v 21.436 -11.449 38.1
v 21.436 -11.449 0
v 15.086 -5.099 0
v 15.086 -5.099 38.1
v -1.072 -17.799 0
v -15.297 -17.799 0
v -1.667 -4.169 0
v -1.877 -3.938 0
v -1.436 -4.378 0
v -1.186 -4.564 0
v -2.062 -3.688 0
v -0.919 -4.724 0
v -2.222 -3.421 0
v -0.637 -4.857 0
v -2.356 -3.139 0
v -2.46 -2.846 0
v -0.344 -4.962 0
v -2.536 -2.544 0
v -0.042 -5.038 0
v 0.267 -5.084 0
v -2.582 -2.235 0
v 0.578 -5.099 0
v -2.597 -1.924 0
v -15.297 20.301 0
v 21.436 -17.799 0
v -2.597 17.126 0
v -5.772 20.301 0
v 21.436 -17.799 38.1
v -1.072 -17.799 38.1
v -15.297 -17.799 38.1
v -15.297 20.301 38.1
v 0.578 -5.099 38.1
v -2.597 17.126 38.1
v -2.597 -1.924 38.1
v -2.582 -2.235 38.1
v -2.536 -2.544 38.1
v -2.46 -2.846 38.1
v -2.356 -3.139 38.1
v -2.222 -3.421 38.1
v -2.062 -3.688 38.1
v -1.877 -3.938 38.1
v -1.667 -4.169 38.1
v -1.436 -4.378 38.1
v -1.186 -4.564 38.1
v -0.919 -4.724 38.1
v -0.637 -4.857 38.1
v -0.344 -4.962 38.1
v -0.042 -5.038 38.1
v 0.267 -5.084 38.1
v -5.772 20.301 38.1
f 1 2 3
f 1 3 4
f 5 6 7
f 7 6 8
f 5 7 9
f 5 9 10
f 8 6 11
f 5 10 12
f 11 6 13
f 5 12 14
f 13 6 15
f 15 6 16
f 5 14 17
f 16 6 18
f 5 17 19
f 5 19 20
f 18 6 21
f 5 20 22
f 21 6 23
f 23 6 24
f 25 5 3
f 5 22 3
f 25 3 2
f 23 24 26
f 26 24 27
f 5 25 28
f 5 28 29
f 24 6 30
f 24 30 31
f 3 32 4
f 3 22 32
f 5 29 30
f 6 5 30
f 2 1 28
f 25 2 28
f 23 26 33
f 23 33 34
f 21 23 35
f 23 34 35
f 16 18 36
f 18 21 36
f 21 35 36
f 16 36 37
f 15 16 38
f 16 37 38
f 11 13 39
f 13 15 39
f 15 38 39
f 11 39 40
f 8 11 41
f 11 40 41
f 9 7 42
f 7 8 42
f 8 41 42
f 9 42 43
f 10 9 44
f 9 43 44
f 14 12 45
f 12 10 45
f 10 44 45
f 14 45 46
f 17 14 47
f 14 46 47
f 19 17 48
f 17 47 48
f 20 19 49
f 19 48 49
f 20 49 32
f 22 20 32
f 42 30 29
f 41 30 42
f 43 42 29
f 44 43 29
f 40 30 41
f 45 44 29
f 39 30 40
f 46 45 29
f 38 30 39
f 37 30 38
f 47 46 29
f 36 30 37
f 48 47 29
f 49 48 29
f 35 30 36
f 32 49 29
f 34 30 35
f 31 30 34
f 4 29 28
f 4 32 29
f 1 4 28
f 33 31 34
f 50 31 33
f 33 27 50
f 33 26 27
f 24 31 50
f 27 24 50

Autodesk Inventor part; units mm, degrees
ref_plane "YZ Plane" through (0, 0, 0) normal (1, 0, 0) x (0, 1, 0)
ref_plane "XZ Plane" through (0, 0, 0) normal (0, 1, 0) x (-1, 0, 0)
ref_plane "XY Plane" through (0, 0, 0) normal (0, 0, 1) x (1, 0, 0)
sketch "Sketch1" plane through (0, 0, 0) normal (0, 0, 1) x (1, 0, 0)
  line L0 (-15.2972, 20.3009) -> (-2.5972, 20.3009)
  line L1 (-2.5972, 20.3009) -> (-2.5972, -5.0991)
  line L2 (-1.0722, -17.7991) -> (-15.2972, -17.7991)
  line L3 (-15.2972, -17.7991) -> (-15.2972, 20.3009)
  line L4 (-2.5972, -5.0991) -> (21.4362, -5.0991)
  line L5 (21.4362, -5.0991) -> (21.4362, -17.7991)
  line L6 (21.4362, -17.7991) -> (-1.0722, -17.7991)
  point P0 (0, 0)
  dimension "d0" = 38.1
  dimension "d1" = 12.7
  dimension "d2" = 25.4
extrude "Extrusion1" add sketch "Sketch1" along normal blind 38.1
chamfer "Chamfer1" distance 3.175 angle 45 1 edges at (-2.5972, 20.3009, 19.05)
chamfer "Chamfer2" distance 6.35 angle 45 1 edges at (21.4362, -5.0991, 19.05)
fillet "Fillet2" radius 3.175 1 edges at (-2.5972, -5.0991, 19.05)
properties part number "ChamferAngle"
